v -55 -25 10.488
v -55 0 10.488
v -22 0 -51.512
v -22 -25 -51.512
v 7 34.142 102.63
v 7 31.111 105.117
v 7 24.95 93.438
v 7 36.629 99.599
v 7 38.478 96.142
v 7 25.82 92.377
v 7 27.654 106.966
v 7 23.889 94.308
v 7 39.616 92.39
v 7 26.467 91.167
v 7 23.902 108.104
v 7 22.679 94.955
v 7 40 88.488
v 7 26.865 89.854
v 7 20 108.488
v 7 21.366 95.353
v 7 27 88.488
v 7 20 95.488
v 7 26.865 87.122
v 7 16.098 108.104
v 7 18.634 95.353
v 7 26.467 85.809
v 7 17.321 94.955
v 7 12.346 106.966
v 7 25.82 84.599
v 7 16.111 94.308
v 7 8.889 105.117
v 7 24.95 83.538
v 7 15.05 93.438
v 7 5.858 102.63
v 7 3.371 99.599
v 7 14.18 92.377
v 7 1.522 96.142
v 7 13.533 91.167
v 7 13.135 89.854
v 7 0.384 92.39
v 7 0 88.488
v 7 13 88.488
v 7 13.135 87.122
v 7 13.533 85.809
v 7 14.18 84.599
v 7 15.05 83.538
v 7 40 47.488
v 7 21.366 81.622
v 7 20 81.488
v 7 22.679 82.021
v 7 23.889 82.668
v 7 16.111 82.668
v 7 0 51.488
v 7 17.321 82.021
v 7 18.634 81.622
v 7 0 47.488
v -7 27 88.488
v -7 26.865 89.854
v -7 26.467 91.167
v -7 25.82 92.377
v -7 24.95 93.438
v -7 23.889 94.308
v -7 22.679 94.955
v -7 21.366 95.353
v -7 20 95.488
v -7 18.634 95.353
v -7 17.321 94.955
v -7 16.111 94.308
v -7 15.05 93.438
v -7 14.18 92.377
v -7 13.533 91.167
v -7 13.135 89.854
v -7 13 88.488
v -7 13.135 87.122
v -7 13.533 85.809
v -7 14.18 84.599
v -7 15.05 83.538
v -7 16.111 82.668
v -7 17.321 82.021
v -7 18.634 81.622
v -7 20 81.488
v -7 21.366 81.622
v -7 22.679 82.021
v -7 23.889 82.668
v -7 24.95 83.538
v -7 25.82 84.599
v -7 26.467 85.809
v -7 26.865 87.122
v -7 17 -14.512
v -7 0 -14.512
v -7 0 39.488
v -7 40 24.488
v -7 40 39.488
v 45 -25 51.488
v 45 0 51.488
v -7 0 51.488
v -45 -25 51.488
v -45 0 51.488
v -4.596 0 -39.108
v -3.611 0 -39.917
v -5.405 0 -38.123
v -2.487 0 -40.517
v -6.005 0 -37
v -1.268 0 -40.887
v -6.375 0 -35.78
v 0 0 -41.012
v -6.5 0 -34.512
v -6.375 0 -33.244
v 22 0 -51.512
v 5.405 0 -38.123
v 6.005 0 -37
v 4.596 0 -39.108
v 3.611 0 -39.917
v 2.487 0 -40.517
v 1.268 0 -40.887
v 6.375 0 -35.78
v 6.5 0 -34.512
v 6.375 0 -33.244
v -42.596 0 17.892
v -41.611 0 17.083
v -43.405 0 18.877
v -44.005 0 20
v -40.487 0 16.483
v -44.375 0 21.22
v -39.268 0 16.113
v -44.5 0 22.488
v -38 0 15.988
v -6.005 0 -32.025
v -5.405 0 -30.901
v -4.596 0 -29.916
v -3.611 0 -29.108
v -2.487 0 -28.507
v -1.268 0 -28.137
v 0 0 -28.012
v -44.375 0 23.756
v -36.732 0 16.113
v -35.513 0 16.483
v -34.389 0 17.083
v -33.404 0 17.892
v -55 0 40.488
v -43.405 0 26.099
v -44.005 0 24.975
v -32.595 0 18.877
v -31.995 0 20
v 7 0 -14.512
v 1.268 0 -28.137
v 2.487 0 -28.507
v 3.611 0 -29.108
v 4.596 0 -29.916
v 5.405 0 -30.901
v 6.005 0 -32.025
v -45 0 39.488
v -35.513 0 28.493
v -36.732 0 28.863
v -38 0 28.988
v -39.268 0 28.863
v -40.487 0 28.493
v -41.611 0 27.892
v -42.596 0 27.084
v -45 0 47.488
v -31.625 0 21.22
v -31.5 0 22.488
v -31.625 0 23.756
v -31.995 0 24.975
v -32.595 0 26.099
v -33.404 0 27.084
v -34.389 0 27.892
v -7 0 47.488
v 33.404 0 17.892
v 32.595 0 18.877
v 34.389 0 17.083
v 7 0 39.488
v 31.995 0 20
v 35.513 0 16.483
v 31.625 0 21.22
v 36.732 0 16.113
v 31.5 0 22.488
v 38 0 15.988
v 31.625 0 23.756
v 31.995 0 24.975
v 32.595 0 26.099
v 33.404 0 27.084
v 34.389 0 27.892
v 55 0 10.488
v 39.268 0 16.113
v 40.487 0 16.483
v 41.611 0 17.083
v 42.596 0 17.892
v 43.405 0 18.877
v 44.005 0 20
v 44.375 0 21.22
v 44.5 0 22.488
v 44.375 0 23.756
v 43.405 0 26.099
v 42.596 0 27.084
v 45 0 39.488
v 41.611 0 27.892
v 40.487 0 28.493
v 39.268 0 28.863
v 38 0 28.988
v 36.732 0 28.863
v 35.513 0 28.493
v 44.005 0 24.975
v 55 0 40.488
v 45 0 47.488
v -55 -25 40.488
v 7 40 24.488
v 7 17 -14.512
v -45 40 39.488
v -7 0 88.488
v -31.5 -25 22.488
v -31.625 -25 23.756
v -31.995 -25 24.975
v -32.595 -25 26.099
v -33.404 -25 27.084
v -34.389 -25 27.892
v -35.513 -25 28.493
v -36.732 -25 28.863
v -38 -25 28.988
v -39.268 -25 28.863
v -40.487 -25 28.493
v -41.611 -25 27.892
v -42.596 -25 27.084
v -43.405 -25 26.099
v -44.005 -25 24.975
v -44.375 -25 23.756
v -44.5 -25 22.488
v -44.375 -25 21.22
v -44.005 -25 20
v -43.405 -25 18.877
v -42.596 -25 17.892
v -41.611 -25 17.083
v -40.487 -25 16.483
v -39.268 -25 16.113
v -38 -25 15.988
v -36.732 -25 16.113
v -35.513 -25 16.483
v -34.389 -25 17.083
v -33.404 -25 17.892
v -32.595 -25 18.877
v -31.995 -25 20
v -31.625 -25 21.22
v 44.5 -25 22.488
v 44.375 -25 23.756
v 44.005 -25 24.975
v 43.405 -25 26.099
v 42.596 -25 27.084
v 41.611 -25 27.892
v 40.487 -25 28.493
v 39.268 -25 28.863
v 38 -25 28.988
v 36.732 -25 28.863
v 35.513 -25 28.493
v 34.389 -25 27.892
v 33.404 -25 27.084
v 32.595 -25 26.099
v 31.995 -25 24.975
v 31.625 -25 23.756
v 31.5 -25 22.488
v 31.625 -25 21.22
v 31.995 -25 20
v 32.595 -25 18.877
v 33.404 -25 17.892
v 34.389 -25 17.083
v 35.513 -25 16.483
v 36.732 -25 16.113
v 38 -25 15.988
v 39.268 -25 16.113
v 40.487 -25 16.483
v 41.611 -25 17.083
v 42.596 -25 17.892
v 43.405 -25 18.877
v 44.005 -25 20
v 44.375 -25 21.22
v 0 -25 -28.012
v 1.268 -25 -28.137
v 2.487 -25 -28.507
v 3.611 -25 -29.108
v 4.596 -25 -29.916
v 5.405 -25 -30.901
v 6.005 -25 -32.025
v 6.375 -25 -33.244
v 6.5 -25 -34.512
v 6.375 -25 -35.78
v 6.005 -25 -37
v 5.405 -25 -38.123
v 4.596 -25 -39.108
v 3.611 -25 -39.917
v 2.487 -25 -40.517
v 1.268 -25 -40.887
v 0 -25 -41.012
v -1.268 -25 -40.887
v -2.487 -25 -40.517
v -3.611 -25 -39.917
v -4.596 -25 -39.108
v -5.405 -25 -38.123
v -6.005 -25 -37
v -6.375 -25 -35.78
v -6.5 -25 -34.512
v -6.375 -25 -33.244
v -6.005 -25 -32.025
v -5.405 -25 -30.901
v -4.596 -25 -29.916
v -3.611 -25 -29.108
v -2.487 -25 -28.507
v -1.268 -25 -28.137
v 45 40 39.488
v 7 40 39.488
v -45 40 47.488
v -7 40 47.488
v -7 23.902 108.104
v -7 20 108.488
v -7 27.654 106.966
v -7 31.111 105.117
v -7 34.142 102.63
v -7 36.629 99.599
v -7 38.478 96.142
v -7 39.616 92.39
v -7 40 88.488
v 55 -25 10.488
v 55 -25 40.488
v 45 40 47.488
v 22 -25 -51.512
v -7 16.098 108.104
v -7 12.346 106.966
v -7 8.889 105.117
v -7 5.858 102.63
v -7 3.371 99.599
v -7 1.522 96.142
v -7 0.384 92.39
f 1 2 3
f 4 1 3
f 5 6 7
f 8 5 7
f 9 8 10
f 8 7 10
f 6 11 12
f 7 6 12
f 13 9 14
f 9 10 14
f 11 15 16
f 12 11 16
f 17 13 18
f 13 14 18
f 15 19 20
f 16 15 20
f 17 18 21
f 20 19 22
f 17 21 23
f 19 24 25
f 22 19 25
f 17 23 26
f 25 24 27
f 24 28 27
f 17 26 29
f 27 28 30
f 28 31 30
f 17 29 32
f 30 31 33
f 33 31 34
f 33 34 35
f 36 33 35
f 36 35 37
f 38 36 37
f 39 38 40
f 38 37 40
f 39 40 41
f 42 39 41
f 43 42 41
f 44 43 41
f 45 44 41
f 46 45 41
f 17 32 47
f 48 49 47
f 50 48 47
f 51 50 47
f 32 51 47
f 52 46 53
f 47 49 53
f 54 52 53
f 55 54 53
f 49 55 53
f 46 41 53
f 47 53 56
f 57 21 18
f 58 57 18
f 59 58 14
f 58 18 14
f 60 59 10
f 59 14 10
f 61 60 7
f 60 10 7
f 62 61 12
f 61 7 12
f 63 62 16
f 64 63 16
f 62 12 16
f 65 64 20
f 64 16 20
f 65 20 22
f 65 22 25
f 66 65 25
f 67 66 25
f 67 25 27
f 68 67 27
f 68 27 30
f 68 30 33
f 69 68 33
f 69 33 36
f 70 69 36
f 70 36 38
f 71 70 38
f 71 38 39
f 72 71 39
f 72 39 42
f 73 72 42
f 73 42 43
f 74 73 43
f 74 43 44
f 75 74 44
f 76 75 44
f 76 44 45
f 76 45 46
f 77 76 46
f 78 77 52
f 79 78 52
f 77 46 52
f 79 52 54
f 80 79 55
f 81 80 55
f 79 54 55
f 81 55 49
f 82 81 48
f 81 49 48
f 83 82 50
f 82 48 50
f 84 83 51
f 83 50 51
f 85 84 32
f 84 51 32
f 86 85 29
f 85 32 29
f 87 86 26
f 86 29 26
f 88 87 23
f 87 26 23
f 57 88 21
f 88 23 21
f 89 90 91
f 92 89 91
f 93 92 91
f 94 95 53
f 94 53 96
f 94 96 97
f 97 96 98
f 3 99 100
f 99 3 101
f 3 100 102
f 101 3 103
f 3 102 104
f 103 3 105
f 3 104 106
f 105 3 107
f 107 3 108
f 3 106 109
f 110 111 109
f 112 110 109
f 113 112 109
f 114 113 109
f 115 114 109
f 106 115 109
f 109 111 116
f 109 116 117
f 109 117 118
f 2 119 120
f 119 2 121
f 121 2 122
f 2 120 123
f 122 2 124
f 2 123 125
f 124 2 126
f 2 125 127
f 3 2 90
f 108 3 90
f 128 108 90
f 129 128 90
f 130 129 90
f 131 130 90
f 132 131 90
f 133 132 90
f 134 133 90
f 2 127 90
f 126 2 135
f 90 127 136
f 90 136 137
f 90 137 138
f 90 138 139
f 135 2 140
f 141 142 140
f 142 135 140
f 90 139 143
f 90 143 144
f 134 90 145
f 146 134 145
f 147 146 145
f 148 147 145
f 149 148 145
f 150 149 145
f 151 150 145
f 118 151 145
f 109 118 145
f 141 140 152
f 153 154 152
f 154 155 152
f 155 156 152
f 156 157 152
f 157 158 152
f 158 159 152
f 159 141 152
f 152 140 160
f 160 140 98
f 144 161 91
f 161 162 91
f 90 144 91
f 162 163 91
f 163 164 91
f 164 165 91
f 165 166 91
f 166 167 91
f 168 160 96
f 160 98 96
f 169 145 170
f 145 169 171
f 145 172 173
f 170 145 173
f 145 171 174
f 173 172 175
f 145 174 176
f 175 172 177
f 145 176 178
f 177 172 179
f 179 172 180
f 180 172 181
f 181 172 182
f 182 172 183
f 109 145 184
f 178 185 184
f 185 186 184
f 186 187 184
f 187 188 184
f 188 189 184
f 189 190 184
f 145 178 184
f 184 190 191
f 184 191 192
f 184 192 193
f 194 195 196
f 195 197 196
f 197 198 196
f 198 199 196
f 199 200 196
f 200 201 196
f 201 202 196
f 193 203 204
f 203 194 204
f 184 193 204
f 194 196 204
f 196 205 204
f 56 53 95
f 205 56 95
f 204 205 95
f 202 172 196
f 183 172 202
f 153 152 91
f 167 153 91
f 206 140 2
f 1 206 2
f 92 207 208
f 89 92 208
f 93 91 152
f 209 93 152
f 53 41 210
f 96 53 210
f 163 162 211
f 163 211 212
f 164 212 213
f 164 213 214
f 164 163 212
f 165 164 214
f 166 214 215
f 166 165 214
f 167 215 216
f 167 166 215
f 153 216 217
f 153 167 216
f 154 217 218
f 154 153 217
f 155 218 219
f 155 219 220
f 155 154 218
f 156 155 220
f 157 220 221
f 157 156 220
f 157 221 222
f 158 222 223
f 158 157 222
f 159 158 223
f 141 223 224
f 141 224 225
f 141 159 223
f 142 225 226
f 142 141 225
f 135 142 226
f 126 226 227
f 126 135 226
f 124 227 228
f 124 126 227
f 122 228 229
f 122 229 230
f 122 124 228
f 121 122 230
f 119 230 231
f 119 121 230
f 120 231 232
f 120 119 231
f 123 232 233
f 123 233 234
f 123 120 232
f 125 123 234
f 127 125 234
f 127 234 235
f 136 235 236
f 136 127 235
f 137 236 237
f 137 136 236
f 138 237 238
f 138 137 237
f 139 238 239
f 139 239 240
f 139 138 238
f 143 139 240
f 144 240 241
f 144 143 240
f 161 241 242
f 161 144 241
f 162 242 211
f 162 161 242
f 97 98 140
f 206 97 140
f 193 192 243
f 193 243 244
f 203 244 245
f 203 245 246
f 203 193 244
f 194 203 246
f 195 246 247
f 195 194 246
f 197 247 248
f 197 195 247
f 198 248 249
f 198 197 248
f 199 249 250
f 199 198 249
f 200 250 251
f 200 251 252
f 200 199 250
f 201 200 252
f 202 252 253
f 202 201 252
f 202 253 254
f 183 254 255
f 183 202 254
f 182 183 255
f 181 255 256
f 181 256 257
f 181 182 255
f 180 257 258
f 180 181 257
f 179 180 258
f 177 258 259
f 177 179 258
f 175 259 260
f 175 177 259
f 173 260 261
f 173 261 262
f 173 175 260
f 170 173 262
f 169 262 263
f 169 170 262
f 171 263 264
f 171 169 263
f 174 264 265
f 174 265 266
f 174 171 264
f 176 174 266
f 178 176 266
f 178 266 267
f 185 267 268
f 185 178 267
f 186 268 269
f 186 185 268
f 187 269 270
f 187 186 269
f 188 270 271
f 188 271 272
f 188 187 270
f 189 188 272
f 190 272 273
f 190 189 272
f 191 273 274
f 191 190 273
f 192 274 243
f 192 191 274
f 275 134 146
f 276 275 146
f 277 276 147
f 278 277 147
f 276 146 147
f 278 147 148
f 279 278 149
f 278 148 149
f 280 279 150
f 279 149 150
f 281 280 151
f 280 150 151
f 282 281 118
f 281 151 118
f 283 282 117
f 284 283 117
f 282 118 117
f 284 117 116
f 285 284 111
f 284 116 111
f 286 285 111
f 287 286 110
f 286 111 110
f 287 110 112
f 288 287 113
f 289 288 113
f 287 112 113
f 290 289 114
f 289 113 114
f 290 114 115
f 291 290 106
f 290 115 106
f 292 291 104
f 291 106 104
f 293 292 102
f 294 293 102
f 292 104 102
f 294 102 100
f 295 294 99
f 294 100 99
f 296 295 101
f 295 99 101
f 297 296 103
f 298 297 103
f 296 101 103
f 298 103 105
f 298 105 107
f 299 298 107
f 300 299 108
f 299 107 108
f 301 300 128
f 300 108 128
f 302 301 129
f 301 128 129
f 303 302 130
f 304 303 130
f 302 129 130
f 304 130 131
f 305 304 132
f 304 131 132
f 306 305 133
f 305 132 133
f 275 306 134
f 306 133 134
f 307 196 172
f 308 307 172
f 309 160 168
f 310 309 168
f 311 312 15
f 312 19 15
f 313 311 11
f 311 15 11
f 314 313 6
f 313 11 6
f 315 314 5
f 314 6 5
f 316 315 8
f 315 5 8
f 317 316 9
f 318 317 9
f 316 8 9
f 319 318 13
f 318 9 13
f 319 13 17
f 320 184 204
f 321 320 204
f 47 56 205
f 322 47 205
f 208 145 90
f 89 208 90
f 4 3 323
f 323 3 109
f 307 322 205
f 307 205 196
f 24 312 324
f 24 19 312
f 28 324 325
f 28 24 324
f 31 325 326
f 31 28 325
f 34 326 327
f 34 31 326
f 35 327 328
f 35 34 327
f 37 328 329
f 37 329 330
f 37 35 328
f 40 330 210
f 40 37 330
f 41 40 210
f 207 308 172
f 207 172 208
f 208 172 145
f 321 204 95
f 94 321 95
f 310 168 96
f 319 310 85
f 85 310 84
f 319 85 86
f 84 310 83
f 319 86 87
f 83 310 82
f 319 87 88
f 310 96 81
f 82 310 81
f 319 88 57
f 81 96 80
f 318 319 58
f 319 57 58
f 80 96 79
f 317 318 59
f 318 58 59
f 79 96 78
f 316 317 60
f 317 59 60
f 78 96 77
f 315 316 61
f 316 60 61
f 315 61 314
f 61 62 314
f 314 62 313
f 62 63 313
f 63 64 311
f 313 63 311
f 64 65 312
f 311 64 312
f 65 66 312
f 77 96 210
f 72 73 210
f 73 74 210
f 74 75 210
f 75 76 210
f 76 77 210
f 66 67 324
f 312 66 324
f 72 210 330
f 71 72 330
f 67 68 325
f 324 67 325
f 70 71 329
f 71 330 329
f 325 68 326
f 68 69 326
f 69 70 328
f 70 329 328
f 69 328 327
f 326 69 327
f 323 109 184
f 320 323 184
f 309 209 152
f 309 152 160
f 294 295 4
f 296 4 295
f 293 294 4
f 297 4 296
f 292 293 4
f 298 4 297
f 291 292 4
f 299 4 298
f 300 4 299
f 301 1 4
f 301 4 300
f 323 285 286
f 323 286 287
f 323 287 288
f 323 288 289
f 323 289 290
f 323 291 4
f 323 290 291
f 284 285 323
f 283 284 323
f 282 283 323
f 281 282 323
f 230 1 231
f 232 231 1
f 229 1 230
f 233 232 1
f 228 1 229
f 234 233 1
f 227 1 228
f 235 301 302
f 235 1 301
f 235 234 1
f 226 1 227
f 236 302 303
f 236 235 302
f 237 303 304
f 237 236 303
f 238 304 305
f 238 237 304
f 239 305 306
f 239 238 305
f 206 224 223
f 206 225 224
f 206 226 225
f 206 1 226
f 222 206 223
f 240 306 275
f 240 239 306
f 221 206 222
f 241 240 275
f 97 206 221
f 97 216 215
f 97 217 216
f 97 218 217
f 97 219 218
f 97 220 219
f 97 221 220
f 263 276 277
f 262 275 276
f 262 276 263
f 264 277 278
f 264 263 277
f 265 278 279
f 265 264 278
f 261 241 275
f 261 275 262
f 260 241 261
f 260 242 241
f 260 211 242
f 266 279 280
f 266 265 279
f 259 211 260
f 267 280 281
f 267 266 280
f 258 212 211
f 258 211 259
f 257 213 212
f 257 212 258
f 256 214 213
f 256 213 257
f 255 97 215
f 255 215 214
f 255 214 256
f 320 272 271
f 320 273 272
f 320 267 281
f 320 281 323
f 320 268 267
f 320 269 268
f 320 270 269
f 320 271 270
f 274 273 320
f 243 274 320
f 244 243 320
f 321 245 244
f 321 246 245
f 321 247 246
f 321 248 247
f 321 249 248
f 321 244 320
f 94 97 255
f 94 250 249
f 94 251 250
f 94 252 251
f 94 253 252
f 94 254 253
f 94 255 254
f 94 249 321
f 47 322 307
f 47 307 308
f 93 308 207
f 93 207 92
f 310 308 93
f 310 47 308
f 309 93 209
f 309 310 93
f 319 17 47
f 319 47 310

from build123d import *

# Parameters (mm, degrees)
F0_R     = 6.5
F1_DEPTH = 25
F3_DEPTH = 40
F4_R     = 19.99999
F5_R     = 7
F6_DEPTH = 25


# Not quite as in the source:
# - a fillet or chamfer is up to 0.001 mm smaller than in the source, because OpenCascade refuses the exact size


with BuildPart() as f1:
    # F0 (on Front) → F1 (new body)
    with BuildSketch(Plane.XZ):
        with BuildLine():
            Line((0, -28.0120762104), (0, 51.4879237896))
            Line((0, 51.4879237896), (-45, 51.4879237896))
            Line((-45, 51.4879237896), (-55, 40.4879237896))
            Line((-55, 40.4879237896), (-55, 10.4879237896))
            Line((-55, 10.4879237896), (-22, -51.5120762104))
            Line((-22, -51.5120762104), (0, -51.5120762104))
            Line((0, -51.5120762104), (0, -41.0120762104))
            ThreePointArc((0, -41.0120762104), (-6.5, -34.5120762104), (0, -28.0120762104))
        make_face()
        with Locations((-38, 22.4879237896)):
            Circle(F0_R, mode=Mode.SUBTRACT)
        with BuildLine():
            Line((45, 51.4879237896), (0, 51.4879237896))
            Line((0, 51.4879237896), (0, -28.0120762104))
            ThreePointArc((0, -28.0120762104), (6.5, -34.5120762104), (0, -41.0120762104))
            Line((0, -41.0120762104), (0, -51.5120762104))
            Line((0, -51.5120762104), (22, -51.5120762104))
            Line((22, -51.5120762104), (55, 10.4879237896))
            Line((55, 10.4879237896), (55, 40.4879237896))
            Line((55, 40.4879237896), (45, 51.4879237896))
        make_face()
        with Locations((38, 22.4879237896)):
            Circle(F0_R, mode=Mode.SUBTRACT)
    extrude(amount=F1_DEPTH)

    # F2 (on face) → F3 (join)
    with BuildSketch(Plane(origin=(0, 0, 0), x_dir=(-1, 0, 0), z_dir=(0, 1, 0))):
        Polygon((7, 108.4879237896), (0, 108.4879237896), (-7, 108.4879237896), (-7, 47.4879237896), (-45, 47.4879237896), (-45, 39.4879237896), (-7, 39.4879237896), (-7, -14.5120762104), (0, -14.5120762104), (7, -14.5120762104), (7, 39.4879237896), (45, 39.4879237896), (45, 47.4879237896), (7, 47.4879237896), align=None)
    extrude(amount=F3_DEPTH)

    # F4 (radius 20 in the source; OpenCascade refuses exactly that, so slightly less here)
    f4_edges = [f1.edges().sort_by_distance(p)[0] for p in [
        (0, 0, 108.487924),
        (0, 40, 108.487924),
    ]]
    fillet(f4_edges, radius=F4_R)

    # F5 (on face) → F6 (cut)
    with BuildSketch(Plane.YZ.offset(7)):
        with Locations((20, 88.4879237896)):
            Circle(F5_R)
        Polygon((40, -14.5120762104), (40, 24.4879237896), (17, -14.5120762104), align=None)
    extrude(amount=-F6_DEPTH, mode=Mode.SUBTRACT)


solid = f1.part
